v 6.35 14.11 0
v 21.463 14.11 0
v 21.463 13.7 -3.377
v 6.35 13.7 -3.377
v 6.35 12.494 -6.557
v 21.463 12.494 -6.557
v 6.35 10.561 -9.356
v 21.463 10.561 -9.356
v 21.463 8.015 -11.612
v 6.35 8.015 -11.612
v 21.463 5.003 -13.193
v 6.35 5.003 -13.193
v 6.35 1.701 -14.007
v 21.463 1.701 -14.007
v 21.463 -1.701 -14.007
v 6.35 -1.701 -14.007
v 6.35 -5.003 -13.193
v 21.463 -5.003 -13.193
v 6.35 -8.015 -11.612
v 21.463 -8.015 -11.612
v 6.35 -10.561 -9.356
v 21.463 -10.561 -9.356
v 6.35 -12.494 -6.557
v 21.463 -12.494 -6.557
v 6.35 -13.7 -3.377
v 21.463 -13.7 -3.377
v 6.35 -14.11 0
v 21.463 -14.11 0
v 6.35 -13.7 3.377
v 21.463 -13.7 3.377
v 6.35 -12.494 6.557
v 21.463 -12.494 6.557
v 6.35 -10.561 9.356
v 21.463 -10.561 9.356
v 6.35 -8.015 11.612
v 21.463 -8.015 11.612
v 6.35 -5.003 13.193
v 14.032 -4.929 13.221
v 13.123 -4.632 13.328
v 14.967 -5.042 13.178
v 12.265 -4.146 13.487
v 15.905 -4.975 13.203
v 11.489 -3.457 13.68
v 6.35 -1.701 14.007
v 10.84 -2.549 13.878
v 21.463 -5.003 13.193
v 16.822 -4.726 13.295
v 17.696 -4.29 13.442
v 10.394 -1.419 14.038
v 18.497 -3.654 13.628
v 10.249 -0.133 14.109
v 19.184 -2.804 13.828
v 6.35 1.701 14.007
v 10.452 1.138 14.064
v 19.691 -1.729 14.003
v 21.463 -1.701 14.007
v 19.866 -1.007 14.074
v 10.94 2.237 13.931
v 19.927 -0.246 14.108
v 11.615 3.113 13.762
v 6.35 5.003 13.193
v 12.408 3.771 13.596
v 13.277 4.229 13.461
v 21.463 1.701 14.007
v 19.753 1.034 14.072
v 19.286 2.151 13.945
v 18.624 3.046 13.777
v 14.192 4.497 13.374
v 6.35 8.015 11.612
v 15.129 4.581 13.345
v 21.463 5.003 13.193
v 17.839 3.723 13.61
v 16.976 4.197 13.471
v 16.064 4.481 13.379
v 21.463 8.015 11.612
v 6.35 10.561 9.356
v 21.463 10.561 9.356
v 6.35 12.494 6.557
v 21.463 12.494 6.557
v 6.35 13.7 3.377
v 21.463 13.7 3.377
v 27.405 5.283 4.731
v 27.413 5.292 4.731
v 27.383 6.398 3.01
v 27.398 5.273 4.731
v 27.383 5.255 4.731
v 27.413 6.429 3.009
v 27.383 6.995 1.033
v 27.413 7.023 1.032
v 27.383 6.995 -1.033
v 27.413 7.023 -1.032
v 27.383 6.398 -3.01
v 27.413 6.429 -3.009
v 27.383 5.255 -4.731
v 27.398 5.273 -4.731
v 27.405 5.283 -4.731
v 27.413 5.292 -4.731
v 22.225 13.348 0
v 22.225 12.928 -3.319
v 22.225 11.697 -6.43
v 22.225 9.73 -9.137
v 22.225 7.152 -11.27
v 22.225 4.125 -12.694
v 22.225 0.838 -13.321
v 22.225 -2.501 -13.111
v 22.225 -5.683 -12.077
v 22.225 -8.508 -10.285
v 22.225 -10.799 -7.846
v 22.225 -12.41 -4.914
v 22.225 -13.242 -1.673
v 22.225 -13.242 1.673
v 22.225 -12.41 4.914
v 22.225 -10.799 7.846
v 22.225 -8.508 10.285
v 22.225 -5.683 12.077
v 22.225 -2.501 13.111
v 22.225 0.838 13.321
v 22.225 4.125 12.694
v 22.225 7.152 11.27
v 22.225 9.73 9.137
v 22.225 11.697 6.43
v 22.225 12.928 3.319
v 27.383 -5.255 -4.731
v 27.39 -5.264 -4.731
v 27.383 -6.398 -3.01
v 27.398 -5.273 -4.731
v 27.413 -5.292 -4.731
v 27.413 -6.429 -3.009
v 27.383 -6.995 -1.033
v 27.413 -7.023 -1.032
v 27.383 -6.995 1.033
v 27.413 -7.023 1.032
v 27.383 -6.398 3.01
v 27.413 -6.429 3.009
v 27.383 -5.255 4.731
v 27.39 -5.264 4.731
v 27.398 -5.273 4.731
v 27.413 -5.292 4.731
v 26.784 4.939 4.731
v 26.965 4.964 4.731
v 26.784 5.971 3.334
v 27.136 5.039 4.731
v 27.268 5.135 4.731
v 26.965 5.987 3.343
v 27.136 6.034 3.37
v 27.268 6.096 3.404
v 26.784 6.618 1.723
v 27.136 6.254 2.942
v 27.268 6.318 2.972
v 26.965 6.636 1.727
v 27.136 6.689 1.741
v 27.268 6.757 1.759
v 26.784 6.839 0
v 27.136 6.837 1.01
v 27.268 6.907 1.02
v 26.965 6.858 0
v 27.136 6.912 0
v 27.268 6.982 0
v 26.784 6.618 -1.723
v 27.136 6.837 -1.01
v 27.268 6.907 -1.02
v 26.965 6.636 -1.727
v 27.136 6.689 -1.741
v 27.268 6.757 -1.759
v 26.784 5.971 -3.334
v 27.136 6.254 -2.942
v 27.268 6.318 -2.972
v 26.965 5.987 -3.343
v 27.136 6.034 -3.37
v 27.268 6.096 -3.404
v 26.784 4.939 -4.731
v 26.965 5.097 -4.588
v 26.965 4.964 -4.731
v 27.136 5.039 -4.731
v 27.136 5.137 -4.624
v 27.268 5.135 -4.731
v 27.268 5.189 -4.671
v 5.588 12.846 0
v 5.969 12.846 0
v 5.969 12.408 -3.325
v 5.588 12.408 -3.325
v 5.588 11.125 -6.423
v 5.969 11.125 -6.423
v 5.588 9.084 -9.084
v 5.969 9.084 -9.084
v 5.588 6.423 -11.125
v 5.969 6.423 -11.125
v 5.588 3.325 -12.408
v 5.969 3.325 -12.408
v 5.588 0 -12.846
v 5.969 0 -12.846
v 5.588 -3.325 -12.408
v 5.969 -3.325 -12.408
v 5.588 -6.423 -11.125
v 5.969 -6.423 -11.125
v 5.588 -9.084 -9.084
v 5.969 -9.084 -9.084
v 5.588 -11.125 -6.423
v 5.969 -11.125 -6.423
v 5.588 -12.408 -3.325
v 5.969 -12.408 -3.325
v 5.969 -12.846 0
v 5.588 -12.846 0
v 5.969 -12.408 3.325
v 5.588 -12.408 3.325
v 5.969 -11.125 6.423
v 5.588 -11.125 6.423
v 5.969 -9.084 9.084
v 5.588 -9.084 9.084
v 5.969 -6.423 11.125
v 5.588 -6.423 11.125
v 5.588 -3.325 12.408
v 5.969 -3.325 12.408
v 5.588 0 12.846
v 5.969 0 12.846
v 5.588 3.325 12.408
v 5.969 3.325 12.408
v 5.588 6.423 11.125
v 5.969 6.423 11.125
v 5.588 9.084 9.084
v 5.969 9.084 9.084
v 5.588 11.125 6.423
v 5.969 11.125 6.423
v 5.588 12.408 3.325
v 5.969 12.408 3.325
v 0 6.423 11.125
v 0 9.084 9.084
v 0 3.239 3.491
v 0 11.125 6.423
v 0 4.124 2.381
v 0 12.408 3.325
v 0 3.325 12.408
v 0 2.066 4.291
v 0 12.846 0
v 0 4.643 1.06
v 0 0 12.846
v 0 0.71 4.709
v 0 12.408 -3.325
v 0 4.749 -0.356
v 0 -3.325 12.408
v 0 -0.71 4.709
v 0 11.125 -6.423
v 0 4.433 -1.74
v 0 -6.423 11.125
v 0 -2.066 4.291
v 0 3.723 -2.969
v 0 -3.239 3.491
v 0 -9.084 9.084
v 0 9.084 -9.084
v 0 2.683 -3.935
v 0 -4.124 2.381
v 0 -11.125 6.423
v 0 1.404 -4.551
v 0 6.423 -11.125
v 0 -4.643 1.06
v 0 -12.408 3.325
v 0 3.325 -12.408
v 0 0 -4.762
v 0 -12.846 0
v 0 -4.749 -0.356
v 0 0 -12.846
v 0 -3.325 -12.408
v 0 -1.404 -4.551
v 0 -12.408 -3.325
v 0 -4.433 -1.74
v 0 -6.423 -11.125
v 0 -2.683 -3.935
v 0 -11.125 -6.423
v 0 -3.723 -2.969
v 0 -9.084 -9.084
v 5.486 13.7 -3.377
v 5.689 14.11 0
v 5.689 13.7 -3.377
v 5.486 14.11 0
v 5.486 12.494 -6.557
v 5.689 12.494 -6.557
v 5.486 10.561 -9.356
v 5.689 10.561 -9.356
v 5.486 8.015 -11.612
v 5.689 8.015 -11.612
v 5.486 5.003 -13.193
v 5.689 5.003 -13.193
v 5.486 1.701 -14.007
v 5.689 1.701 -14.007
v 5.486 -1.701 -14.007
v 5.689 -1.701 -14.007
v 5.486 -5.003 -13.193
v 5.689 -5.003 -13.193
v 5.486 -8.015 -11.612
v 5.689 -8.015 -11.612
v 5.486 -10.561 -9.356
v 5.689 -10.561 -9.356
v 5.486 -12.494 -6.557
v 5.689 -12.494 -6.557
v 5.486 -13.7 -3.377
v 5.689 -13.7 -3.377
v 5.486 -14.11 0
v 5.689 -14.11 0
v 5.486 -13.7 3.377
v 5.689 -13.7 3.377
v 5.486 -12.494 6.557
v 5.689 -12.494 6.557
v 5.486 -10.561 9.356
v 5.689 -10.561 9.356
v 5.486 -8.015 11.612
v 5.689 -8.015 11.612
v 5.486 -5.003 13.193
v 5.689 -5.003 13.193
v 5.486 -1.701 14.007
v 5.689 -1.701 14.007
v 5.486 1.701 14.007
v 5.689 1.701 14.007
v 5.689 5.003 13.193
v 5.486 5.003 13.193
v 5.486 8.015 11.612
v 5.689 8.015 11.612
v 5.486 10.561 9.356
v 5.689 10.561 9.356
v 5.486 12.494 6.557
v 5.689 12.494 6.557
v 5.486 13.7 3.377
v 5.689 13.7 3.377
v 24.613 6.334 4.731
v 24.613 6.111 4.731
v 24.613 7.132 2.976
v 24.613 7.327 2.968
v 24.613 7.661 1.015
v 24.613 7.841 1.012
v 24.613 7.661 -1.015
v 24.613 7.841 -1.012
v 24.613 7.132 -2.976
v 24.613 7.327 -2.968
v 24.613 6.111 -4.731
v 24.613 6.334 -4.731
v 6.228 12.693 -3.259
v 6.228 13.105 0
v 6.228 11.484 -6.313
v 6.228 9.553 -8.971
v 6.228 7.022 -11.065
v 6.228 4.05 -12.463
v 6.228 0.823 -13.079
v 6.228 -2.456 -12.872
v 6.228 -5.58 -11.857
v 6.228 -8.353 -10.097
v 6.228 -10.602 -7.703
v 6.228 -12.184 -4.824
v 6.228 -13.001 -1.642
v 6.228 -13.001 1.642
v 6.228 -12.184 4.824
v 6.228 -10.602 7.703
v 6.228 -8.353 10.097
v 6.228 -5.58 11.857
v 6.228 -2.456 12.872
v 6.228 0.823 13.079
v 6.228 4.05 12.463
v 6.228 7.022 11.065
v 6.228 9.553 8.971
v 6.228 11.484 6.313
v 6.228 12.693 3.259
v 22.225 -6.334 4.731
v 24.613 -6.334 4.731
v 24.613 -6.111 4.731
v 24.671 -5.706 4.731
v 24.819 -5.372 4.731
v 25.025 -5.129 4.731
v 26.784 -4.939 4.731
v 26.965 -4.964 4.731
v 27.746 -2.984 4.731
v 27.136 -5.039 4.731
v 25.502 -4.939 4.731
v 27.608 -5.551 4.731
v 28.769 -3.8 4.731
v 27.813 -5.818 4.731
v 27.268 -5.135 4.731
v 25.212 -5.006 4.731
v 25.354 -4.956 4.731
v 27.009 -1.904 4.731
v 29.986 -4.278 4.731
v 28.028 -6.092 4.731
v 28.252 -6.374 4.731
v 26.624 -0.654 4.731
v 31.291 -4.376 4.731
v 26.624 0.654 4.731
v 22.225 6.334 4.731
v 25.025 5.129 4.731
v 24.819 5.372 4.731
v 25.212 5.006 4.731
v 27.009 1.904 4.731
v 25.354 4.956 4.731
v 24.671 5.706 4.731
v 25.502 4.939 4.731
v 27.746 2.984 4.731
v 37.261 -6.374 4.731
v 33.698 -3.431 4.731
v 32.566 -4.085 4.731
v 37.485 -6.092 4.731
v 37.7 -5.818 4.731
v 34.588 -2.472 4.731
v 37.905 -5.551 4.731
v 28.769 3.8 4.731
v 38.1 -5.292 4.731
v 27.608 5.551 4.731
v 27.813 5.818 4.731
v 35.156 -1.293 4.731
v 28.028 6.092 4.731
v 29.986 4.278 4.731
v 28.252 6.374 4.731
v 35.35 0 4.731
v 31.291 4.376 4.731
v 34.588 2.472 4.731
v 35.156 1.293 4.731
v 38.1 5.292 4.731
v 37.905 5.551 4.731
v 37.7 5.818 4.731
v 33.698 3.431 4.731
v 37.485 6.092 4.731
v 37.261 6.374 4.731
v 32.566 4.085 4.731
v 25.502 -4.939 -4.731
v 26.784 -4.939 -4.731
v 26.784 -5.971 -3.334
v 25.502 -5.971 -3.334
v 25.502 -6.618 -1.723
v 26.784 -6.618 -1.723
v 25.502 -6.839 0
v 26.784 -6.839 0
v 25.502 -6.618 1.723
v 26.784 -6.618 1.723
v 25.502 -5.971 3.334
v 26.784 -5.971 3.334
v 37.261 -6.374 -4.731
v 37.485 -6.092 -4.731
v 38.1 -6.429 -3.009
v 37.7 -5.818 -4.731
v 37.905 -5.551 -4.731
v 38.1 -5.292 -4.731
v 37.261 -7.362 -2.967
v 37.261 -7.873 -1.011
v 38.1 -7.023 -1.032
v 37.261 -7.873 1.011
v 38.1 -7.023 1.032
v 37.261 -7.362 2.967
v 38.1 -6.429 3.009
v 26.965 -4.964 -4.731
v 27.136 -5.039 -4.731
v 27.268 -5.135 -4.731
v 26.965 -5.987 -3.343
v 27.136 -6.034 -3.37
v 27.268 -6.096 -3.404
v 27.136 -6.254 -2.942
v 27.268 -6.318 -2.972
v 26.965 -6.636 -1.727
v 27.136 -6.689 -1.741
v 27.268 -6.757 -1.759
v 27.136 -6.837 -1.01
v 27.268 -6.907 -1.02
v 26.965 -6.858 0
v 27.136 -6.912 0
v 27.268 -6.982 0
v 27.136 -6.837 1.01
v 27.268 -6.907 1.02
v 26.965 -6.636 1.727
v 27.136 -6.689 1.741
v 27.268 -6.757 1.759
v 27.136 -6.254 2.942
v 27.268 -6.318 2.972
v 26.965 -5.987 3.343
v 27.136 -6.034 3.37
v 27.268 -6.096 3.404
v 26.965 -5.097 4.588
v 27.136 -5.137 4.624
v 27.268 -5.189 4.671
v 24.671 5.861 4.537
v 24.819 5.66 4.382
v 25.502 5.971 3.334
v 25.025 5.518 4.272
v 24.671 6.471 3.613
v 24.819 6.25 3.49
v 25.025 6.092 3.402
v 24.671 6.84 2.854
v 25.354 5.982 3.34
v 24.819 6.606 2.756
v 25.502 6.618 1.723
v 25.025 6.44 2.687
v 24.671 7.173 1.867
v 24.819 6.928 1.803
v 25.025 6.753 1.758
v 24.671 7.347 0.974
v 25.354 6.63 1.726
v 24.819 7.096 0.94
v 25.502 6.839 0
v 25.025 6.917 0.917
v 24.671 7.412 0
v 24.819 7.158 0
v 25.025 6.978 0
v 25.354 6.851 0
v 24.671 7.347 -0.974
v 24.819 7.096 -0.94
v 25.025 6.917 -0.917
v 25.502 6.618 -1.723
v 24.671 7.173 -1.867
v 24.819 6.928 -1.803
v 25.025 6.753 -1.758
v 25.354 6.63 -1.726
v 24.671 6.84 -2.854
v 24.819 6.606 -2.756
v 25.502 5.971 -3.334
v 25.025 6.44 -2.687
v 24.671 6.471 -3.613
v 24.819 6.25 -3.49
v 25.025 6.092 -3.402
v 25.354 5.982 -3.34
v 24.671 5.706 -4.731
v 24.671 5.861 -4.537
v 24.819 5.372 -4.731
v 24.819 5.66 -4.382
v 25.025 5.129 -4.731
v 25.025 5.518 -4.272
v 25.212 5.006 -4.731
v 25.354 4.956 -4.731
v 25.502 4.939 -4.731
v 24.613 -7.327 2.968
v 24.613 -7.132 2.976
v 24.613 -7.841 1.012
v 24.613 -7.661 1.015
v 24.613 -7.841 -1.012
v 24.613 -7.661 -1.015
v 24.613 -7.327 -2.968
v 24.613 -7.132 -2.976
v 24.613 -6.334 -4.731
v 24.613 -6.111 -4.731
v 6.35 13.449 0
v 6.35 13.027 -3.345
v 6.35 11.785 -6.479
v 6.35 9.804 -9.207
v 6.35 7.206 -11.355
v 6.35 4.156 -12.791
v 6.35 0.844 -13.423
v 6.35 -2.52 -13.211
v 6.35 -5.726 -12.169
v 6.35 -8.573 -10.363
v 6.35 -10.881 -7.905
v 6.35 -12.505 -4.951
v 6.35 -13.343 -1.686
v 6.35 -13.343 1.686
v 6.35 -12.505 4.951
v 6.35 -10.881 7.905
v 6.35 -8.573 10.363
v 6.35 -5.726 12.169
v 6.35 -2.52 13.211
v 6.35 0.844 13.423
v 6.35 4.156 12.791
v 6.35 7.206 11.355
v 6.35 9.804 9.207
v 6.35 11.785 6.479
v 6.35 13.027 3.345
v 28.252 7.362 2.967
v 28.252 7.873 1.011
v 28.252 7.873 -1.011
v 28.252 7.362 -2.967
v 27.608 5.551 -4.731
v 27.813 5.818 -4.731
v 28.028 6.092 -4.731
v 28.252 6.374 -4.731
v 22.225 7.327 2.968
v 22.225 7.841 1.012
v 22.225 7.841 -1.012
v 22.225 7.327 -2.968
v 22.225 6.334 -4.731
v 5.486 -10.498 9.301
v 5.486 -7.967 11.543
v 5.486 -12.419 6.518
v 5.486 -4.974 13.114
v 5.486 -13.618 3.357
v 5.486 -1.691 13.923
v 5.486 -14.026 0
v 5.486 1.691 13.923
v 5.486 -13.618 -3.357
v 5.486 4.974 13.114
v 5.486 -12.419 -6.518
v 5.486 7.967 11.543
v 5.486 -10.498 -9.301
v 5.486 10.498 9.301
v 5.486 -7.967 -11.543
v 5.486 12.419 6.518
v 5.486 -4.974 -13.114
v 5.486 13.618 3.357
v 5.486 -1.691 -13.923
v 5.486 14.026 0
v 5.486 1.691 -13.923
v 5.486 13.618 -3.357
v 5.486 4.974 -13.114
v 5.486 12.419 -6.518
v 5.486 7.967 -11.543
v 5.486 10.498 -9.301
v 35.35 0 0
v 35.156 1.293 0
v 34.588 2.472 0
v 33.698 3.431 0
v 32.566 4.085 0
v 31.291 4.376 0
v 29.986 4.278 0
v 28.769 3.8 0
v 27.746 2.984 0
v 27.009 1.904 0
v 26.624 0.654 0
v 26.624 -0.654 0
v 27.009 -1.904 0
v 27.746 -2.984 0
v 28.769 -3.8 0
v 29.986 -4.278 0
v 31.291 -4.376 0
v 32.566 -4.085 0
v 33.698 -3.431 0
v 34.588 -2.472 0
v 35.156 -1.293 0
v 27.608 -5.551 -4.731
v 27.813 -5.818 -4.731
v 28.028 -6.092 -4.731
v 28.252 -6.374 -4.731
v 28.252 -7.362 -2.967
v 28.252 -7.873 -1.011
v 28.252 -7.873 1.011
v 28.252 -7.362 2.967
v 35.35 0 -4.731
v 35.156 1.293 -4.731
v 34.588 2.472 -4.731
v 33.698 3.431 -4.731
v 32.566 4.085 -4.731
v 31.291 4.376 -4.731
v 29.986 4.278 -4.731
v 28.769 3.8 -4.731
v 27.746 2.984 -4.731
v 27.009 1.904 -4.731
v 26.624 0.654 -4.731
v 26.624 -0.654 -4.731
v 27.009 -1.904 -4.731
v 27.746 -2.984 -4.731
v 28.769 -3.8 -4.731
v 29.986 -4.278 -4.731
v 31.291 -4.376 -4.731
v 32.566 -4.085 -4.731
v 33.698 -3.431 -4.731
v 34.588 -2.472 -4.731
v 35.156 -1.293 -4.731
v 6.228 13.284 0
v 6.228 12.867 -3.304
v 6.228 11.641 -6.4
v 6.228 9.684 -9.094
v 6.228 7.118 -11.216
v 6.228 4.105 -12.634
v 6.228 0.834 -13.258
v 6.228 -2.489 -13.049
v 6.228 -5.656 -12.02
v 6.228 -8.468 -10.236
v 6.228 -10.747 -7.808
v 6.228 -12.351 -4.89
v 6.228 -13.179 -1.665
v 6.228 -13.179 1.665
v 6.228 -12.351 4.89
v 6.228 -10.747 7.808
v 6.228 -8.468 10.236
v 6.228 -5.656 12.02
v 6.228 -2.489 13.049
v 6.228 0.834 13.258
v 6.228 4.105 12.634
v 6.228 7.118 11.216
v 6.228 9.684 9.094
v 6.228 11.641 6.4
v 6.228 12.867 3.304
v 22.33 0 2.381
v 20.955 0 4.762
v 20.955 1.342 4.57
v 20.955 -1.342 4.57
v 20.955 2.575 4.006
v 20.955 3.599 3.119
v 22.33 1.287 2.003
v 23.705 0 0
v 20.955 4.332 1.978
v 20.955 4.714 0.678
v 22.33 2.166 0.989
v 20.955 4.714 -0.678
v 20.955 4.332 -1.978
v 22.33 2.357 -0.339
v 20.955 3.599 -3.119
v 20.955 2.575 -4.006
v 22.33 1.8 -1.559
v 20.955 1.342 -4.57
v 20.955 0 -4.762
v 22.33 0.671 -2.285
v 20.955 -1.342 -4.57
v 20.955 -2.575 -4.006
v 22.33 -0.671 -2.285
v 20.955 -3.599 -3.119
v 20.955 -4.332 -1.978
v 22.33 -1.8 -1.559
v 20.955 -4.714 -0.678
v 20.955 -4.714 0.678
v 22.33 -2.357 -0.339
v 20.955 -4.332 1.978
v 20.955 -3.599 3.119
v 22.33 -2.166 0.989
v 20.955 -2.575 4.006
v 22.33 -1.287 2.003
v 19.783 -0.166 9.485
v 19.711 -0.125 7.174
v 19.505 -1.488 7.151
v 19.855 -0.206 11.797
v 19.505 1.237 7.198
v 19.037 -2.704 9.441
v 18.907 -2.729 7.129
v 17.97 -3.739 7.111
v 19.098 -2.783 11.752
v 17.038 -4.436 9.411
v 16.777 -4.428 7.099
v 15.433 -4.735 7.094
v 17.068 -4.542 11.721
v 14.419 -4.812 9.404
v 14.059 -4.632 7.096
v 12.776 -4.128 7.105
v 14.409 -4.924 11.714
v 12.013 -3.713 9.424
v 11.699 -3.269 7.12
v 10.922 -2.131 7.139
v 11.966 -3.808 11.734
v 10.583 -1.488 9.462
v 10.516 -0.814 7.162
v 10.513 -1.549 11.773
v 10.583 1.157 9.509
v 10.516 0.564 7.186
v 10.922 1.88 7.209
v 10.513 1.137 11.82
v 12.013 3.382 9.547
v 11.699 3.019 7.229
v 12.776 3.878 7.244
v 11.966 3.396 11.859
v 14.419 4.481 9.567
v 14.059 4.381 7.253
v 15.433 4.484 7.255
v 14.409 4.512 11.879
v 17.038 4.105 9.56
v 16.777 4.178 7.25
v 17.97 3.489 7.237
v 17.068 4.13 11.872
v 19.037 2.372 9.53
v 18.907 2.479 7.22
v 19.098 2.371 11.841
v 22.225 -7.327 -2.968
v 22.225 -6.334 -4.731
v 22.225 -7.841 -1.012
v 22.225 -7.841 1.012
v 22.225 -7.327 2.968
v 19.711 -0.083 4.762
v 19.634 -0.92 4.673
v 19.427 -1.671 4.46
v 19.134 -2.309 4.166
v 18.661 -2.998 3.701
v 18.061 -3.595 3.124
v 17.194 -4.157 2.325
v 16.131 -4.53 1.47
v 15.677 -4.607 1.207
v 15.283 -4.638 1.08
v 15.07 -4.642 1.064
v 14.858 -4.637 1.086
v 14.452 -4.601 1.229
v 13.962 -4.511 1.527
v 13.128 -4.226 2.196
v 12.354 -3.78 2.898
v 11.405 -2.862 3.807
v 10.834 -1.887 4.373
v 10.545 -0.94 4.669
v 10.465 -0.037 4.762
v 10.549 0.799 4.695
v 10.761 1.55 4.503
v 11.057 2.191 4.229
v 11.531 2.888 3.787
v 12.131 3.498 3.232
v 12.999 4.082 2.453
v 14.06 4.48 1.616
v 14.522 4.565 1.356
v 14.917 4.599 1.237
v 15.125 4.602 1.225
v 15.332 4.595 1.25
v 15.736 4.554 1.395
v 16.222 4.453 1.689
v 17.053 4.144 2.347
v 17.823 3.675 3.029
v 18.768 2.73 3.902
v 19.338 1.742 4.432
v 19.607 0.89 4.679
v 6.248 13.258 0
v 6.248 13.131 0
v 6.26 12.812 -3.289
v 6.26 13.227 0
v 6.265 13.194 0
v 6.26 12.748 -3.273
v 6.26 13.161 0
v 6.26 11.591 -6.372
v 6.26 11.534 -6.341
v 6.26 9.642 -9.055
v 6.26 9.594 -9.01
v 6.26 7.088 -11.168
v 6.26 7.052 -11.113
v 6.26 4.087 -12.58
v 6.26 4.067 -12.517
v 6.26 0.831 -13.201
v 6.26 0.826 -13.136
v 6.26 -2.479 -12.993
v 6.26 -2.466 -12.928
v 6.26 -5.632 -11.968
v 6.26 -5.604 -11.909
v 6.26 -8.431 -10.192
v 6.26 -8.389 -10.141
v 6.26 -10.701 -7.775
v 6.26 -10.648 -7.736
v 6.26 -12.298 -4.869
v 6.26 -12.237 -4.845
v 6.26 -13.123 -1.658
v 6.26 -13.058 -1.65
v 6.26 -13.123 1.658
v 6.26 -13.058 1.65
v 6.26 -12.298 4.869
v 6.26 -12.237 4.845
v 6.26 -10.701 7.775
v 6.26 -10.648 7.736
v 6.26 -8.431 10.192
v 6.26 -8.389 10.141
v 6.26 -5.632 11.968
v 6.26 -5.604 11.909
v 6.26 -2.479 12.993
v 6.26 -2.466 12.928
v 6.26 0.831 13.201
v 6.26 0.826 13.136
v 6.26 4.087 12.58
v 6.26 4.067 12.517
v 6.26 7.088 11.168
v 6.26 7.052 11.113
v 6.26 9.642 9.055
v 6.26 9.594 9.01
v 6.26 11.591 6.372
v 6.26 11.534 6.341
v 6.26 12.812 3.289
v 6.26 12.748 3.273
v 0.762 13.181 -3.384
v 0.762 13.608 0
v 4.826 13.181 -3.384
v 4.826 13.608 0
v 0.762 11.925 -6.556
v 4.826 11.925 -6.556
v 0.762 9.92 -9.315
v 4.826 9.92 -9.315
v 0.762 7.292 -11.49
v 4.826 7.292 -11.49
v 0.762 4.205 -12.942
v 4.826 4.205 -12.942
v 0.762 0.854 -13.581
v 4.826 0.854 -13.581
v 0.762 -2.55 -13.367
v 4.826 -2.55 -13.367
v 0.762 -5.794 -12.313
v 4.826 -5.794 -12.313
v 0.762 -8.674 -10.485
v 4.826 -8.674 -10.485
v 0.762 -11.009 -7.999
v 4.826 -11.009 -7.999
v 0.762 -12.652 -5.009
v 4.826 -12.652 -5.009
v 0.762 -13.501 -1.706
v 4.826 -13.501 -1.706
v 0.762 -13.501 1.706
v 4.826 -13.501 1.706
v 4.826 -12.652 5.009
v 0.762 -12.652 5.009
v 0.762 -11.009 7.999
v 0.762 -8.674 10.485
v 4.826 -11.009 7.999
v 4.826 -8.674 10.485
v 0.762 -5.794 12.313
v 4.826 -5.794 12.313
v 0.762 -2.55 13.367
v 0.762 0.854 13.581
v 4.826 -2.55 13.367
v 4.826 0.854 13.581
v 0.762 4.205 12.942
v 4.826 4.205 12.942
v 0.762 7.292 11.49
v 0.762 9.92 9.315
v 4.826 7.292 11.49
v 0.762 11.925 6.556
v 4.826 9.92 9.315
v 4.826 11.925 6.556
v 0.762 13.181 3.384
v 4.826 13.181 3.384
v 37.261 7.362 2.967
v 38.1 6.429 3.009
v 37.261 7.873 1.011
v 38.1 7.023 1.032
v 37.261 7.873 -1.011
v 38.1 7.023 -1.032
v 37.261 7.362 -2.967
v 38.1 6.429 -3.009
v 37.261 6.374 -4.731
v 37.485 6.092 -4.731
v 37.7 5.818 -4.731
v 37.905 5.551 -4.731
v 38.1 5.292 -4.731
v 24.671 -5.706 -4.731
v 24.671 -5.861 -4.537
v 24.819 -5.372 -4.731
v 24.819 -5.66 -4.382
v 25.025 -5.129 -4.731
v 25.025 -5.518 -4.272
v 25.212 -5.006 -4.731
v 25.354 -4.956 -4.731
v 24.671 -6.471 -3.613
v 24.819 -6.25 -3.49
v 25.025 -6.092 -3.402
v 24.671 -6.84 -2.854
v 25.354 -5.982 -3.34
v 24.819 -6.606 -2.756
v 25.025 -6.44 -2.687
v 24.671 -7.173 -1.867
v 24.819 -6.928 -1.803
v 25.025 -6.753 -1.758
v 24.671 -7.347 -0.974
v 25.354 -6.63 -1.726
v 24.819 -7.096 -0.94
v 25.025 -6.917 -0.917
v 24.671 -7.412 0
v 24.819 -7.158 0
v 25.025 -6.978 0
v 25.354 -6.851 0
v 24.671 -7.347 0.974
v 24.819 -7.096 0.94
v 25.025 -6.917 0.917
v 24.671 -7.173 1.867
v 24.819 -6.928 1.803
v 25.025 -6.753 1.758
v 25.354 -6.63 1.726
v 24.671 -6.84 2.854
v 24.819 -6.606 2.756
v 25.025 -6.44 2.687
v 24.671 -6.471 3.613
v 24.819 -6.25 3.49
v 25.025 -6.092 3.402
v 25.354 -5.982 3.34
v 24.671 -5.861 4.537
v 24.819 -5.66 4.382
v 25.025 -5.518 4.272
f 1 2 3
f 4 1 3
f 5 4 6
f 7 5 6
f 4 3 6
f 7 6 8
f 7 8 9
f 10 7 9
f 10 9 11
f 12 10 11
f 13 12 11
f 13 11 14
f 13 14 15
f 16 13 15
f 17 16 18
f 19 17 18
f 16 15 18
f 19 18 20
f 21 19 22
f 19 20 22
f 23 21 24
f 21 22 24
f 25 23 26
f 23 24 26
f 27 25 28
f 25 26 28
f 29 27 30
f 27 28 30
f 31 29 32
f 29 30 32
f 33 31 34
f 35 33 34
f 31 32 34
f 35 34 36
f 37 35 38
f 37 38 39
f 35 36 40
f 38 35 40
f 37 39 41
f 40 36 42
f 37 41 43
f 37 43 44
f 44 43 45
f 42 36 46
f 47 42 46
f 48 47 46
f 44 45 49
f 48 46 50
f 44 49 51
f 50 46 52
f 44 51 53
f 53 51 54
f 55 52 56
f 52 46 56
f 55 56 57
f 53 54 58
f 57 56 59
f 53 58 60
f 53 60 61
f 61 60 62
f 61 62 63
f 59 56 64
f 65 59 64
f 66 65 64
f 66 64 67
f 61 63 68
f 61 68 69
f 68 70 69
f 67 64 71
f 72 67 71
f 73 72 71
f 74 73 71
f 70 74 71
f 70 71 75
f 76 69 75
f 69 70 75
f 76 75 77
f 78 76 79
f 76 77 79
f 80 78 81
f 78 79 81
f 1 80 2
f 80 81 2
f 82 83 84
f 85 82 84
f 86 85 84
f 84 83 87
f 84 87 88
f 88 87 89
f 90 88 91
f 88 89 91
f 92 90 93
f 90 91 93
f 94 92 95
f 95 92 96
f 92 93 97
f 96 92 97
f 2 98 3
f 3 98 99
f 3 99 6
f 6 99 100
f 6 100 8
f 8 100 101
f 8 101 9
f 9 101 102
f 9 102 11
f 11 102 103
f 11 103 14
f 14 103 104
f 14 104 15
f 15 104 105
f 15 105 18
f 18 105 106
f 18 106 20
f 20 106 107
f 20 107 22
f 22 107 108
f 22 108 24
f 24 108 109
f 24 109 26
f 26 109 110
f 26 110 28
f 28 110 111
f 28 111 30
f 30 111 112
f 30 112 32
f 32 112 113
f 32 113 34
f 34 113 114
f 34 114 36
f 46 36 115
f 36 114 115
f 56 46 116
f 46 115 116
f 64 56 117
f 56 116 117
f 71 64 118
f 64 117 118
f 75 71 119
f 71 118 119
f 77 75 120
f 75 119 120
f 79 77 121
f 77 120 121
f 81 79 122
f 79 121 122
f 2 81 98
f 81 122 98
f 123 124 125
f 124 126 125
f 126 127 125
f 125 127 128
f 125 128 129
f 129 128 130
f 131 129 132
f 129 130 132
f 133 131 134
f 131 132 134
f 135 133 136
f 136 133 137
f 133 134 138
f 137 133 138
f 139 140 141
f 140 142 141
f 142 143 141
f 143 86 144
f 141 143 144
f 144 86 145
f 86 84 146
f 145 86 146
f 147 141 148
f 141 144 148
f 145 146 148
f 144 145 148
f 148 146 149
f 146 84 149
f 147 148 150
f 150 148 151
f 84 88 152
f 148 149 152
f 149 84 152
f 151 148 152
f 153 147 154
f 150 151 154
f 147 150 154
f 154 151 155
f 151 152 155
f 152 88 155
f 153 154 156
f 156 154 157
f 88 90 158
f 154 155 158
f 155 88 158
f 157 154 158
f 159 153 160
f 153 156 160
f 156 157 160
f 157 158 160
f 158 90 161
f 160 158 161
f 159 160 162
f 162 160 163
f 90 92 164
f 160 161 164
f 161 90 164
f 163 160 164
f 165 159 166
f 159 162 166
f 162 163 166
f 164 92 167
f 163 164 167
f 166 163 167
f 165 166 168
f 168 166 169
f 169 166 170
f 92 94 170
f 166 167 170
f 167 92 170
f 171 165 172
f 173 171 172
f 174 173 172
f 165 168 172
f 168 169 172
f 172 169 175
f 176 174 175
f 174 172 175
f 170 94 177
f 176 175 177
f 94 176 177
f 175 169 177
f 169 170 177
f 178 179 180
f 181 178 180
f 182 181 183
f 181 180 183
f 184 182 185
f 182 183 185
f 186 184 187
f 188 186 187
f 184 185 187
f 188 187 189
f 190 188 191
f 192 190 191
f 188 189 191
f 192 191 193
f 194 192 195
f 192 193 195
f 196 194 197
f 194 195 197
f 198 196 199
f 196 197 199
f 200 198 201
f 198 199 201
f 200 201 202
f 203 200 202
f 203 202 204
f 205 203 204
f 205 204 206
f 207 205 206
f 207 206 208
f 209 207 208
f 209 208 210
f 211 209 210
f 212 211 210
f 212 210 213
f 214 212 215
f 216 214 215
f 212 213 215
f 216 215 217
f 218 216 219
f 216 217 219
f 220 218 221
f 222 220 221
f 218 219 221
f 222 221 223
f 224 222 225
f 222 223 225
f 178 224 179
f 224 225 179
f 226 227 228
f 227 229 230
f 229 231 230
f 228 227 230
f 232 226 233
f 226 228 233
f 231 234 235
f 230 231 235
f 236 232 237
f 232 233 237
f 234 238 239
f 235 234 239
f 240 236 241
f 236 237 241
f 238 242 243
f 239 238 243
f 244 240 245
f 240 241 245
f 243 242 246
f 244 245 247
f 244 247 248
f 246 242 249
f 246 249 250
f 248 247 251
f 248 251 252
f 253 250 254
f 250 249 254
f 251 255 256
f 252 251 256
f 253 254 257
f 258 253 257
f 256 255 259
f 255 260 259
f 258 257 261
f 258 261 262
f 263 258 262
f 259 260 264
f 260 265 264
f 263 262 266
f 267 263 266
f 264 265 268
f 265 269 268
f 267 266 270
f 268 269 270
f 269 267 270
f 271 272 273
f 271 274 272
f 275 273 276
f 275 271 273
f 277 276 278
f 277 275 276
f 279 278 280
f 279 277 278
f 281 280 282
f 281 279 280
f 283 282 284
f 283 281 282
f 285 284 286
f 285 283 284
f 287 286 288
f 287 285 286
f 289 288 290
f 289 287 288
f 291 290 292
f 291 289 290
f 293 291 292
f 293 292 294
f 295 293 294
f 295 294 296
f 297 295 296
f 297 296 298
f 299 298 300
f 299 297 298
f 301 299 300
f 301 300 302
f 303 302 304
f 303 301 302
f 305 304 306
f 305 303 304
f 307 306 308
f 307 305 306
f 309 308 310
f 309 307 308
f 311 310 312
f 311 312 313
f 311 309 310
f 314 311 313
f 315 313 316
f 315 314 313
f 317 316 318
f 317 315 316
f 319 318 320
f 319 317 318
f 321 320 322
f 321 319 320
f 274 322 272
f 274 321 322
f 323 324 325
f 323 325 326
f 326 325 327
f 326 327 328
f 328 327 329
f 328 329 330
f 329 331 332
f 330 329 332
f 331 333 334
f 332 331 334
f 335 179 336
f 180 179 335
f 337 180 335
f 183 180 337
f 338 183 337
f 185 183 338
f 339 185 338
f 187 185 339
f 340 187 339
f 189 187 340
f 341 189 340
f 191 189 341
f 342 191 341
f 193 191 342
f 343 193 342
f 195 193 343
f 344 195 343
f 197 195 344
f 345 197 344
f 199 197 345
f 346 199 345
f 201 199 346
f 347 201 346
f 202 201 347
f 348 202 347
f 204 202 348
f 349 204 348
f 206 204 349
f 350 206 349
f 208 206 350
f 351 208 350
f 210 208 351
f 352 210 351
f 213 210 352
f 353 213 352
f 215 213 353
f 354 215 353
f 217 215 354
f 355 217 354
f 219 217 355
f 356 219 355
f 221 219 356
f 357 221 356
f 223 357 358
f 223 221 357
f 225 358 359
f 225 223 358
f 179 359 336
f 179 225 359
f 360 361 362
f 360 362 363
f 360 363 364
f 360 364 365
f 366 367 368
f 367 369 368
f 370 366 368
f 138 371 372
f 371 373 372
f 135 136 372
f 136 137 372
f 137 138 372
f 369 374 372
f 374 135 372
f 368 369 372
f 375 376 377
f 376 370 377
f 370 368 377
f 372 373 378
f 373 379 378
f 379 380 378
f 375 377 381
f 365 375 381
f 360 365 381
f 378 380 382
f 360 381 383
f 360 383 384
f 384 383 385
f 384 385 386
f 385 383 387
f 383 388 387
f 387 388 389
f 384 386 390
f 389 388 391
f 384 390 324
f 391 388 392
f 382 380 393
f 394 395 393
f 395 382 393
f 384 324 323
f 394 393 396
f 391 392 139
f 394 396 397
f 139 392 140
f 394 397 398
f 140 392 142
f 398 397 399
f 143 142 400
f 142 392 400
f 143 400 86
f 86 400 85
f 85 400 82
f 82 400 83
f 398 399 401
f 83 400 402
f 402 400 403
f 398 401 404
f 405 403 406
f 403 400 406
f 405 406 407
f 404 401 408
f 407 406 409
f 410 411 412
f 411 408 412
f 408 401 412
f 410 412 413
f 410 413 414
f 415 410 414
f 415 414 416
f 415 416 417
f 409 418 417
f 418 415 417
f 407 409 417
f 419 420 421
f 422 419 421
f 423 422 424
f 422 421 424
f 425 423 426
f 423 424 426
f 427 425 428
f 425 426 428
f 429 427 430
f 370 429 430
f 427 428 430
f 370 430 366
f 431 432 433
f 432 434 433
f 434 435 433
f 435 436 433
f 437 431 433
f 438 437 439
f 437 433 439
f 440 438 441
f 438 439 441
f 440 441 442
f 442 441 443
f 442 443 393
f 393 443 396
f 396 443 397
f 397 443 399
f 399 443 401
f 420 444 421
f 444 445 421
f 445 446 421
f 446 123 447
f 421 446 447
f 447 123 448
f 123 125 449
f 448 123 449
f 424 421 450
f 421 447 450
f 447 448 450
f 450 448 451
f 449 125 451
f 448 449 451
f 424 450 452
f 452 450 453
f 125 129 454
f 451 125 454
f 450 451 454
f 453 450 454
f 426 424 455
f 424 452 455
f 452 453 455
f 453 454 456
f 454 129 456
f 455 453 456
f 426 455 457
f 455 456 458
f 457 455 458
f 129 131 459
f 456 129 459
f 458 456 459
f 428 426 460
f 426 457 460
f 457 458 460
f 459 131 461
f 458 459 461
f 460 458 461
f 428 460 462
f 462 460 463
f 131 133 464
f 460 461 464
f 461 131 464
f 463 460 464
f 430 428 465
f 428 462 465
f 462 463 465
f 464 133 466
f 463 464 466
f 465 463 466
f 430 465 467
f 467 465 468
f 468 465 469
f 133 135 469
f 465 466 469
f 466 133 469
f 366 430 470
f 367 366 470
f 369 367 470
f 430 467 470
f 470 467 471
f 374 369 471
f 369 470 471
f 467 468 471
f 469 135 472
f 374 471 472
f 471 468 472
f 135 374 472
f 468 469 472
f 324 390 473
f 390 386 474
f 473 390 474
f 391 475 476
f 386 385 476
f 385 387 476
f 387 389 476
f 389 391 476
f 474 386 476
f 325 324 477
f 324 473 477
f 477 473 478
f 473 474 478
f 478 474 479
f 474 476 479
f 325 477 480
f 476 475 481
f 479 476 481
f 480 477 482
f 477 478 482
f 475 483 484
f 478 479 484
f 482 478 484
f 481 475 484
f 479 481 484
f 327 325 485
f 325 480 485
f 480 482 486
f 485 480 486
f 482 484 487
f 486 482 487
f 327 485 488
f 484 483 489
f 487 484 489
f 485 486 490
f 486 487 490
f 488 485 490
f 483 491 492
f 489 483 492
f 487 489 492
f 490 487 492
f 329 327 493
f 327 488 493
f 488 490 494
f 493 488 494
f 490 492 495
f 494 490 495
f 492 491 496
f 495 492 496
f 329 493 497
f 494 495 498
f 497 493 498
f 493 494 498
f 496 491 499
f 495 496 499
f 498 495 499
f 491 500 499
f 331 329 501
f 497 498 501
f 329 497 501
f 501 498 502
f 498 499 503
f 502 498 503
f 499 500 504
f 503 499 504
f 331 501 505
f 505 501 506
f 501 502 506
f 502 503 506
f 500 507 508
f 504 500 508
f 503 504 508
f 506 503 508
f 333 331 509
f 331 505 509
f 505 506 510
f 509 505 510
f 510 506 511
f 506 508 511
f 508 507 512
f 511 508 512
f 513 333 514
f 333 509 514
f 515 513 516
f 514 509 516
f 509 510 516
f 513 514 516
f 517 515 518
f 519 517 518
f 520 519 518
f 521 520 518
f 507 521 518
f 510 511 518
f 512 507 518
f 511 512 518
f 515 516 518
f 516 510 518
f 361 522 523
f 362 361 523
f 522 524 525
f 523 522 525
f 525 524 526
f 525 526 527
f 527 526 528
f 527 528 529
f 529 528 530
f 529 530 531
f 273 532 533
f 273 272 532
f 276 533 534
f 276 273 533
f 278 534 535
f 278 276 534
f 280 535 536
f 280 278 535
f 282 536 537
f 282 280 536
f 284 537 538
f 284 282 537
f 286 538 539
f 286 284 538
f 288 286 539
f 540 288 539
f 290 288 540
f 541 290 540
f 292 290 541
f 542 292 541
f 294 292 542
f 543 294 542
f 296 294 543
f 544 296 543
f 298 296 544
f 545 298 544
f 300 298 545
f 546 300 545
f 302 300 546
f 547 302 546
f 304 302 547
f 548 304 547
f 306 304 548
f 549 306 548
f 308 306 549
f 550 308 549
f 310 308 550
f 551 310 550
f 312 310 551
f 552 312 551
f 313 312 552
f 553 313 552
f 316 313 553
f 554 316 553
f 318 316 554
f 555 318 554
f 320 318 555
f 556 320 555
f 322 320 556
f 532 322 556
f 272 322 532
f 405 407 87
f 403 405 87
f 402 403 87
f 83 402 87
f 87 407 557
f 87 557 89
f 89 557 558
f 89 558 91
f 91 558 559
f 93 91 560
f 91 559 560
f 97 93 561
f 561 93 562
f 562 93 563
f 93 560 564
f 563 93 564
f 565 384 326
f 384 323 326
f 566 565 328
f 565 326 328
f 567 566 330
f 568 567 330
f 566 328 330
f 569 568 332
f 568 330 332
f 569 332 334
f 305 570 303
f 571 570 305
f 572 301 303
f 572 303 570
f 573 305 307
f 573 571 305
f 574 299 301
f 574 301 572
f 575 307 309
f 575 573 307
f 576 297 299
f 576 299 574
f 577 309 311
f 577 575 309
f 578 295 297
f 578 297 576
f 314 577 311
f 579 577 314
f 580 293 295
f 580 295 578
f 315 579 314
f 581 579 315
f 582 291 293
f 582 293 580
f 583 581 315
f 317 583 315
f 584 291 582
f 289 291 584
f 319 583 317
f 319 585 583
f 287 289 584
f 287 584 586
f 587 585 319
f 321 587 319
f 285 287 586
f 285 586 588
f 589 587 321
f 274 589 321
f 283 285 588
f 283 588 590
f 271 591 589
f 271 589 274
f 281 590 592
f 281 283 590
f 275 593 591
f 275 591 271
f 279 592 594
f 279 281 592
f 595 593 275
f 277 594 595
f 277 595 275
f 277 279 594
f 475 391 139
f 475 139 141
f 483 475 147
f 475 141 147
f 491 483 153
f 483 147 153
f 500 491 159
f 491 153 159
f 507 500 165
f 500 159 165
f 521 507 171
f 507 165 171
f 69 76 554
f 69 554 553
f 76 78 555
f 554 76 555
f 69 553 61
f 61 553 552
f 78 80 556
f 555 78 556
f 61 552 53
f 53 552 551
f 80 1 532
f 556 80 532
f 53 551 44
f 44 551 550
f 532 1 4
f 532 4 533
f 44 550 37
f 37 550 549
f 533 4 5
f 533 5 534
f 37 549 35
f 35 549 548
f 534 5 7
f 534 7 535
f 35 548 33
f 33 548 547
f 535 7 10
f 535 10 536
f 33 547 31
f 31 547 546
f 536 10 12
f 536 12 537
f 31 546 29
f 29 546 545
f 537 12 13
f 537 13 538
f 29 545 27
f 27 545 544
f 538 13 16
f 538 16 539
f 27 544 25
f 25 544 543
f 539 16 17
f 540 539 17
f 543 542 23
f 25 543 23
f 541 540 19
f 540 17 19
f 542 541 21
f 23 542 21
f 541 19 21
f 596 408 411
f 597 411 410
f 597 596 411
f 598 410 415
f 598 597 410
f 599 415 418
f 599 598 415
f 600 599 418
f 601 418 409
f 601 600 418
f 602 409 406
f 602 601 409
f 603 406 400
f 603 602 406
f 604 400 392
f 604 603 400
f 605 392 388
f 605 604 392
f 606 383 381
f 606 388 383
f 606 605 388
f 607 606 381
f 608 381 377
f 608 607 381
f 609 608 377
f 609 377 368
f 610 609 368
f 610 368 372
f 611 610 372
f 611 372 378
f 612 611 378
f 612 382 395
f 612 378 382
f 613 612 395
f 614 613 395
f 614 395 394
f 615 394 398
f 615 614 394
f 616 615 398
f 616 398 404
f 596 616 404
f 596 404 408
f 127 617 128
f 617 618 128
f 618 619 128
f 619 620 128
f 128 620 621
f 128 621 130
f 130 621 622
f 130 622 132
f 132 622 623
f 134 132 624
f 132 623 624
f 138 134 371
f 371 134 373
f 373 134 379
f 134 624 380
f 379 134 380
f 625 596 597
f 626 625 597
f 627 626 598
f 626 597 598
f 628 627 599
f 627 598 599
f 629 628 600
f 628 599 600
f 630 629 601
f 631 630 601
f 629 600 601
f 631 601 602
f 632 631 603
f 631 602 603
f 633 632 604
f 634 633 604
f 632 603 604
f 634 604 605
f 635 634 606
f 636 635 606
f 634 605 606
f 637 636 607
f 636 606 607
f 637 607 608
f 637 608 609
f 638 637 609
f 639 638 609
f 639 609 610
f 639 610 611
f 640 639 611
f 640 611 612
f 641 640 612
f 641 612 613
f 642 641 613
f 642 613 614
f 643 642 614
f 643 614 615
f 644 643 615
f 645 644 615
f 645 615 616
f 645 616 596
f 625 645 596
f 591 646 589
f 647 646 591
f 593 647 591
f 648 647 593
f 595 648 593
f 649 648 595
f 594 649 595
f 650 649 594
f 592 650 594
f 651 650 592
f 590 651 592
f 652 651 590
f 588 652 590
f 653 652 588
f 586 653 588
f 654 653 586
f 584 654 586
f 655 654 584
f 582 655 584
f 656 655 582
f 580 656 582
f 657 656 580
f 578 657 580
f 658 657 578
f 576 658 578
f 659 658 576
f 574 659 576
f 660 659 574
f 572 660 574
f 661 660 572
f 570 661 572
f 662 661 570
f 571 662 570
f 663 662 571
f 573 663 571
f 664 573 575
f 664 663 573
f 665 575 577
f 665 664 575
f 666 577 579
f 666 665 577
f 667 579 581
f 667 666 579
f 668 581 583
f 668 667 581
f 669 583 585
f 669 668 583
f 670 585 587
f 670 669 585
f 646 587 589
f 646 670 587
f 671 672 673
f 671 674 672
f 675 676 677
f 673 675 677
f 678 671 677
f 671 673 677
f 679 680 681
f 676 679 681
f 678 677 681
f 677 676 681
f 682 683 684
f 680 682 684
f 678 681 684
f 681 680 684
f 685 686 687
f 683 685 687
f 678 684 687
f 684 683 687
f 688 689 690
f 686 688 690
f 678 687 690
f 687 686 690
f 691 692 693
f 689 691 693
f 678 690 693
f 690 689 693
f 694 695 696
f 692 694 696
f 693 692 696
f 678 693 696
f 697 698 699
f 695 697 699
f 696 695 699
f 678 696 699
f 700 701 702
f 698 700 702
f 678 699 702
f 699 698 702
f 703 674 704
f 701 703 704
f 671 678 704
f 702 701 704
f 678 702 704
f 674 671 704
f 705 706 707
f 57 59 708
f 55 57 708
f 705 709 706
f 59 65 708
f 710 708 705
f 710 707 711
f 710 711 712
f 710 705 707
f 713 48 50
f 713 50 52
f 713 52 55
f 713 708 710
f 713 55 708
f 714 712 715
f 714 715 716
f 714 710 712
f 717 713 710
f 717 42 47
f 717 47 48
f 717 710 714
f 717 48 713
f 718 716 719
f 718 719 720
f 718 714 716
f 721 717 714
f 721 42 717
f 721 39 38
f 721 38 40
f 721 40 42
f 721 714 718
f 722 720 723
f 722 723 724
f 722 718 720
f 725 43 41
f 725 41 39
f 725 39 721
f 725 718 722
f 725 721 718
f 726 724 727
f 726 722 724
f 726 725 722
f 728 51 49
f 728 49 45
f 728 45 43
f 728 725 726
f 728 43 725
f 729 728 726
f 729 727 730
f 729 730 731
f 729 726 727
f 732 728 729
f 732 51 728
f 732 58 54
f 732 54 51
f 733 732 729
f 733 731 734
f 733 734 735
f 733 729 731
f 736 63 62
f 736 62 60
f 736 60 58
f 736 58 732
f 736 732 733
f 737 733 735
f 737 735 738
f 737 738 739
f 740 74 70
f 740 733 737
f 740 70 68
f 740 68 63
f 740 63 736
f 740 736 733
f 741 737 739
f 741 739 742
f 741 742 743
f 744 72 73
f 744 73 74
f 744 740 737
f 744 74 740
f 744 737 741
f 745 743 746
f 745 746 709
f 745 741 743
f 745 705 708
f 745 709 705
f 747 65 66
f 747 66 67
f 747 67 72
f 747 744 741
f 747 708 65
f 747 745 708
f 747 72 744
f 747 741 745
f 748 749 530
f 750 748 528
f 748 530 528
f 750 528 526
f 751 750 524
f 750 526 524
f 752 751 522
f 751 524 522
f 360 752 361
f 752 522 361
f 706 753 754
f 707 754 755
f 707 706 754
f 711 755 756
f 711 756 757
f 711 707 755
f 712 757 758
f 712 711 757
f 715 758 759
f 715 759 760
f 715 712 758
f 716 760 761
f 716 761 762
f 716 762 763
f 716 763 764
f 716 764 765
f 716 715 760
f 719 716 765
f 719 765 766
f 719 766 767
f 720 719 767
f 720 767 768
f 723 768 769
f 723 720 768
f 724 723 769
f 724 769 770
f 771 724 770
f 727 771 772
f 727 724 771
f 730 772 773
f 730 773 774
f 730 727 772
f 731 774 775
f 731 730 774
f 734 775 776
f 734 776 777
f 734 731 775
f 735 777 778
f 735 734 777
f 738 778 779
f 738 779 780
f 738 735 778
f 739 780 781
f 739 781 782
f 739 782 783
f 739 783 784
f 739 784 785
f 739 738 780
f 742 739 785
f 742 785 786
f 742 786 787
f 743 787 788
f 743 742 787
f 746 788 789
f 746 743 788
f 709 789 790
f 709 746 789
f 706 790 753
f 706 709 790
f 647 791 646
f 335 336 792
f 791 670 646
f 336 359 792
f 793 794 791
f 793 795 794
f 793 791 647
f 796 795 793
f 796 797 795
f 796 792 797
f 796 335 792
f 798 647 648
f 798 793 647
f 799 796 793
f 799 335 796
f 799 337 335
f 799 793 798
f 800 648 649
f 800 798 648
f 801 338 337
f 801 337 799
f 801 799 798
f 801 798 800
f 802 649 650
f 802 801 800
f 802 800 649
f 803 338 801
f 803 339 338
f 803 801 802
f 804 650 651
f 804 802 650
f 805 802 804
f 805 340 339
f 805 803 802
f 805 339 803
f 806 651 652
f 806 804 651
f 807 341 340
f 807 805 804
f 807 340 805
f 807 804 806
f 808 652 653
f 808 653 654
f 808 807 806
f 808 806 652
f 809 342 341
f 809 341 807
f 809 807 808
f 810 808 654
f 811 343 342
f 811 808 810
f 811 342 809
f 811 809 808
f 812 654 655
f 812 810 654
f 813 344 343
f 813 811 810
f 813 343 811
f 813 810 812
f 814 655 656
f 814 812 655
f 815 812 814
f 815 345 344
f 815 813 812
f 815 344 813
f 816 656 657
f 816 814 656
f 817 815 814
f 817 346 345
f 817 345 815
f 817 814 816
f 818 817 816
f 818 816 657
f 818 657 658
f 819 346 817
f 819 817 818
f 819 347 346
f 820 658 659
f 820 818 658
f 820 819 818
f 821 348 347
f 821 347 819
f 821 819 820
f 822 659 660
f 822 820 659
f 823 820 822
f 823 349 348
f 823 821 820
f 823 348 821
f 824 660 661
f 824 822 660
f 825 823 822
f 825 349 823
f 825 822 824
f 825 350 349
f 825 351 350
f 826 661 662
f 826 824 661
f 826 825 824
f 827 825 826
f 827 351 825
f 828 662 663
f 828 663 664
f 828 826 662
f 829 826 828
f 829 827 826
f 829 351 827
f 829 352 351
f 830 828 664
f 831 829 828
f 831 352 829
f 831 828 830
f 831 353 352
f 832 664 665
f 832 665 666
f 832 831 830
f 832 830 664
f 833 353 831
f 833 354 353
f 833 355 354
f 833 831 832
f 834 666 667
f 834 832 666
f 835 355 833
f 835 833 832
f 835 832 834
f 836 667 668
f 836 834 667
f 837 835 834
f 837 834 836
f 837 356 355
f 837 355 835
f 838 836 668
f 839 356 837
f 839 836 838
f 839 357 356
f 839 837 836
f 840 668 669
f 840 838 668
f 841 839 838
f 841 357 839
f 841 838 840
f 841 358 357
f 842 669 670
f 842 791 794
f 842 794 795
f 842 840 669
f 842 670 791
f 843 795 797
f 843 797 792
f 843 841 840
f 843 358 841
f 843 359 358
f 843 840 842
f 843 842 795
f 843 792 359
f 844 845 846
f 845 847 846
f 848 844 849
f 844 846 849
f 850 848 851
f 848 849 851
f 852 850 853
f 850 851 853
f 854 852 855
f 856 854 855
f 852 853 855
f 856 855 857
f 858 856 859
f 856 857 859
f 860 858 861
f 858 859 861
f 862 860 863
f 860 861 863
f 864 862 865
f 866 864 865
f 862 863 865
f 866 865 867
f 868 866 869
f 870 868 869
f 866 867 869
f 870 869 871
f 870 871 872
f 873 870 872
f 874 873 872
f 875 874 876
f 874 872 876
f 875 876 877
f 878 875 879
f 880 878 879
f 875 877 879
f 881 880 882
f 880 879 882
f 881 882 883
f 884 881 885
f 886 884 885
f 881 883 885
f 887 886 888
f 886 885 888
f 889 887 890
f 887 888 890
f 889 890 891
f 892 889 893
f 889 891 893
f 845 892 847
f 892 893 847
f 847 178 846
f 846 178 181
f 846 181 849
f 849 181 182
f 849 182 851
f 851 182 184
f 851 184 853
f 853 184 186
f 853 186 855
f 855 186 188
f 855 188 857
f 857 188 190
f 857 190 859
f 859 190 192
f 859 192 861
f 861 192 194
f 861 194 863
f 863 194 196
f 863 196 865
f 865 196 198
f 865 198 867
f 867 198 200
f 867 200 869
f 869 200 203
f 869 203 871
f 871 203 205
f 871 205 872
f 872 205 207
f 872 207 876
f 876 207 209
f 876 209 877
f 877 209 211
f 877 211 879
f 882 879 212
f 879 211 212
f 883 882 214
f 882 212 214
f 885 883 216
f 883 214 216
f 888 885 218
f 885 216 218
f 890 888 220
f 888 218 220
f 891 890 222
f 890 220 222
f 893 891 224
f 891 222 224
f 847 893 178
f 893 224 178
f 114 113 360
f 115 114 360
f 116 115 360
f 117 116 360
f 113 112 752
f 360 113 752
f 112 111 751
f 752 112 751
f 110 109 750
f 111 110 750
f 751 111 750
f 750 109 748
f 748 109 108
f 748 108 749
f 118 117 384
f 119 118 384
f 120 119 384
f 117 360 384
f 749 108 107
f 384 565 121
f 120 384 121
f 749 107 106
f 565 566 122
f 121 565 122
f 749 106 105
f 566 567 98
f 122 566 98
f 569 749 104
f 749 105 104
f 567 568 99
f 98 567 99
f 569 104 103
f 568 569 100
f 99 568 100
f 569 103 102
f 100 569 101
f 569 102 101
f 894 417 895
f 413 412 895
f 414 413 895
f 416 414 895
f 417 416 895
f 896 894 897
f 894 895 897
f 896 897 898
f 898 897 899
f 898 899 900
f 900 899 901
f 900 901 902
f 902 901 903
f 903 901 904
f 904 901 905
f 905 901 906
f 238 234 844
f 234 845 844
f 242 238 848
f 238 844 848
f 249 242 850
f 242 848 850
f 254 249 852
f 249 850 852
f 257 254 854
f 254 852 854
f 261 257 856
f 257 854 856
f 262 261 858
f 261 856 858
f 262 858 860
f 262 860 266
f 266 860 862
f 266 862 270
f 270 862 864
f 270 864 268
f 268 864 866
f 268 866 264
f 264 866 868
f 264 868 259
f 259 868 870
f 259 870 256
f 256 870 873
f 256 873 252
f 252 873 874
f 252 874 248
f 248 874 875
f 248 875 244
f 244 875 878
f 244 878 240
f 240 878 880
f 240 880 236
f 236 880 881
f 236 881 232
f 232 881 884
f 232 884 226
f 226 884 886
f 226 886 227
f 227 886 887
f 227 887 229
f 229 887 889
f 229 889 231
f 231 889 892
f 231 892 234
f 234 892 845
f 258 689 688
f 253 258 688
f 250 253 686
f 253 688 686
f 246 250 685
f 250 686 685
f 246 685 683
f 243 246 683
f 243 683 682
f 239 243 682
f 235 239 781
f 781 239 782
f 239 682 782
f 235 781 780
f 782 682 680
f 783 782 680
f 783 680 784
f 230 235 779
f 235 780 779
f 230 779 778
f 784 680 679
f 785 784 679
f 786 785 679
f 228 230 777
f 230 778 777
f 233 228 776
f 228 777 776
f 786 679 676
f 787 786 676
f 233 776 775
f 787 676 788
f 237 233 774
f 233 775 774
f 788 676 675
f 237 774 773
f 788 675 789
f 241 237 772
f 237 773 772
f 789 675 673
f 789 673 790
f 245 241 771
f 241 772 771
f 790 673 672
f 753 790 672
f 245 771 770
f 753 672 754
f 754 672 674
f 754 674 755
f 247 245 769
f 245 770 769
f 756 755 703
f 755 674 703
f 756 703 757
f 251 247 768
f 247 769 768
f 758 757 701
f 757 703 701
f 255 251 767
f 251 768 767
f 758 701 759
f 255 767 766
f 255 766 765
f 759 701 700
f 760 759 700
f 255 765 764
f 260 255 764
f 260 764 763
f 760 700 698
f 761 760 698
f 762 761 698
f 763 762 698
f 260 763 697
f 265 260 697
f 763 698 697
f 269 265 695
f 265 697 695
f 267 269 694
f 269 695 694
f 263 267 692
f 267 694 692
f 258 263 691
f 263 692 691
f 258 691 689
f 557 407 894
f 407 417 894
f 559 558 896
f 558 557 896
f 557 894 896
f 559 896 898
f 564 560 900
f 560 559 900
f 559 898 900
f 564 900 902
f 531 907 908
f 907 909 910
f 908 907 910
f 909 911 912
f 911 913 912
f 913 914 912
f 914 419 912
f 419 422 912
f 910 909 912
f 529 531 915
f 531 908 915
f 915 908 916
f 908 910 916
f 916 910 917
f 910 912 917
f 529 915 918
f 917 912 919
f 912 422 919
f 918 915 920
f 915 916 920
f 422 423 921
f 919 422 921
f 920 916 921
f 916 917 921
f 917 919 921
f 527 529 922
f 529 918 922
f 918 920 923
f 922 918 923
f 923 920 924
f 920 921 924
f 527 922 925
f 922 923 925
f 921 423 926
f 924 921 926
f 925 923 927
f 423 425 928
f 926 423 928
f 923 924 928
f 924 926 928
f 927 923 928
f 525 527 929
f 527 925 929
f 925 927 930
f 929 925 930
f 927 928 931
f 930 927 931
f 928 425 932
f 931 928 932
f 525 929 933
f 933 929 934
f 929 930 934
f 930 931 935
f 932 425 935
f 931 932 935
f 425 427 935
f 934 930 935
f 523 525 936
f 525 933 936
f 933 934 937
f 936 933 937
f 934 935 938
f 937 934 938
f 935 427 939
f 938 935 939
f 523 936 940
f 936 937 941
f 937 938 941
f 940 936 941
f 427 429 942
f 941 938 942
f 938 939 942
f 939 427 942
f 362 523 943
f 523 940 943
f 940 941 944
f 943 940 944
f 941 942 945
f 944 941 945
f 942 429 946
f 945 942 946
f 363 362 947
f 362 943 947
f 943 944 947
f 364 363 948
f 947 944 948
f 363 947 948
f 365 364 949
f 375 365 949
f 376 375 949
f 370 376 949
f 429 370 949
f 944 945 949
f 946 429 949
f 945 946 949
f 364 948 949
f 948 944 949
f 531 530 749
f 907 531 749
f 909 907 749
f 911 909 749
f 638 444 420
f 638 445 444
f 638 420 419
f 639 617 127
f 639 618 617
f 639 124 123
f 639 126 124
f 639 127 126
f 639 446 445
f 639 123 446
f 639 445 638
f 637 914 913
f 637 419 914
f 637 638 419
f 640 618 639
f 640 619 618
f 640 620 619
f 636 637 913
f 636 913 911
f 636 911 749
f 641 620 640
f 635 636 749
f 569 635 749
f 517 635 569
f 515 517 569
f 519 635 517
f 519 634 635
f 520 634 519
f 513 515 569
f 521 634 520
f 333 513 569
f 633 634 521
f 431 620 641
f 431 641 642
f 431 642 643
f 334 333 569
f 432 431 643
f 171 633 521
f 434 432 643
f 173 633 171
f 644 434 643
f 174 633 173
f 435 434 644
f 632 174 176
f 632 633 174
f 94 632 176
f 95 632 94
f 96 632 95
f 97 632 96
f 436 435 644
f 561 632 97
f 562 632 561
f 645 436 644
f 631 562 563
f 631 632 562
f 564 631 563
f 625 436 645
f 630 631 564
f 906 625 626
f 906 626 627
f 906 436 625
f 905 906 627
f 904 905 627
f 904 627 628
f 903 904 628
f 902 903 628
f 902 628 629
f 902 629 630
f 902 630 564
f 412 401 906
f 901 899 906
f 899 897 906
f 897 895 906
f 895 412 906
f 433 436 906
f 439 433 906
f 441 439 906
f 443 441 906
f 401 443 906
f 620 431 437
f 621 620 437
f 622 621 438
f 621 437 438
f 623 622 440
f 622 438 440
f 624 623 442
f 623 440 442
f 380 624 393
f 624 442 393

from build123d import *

# Parameters (mm, degrees)
SKETCH3_W               = 56.4388
SKETCH3_H               = 112.8776
SKETCH3_W_2             = 9.4615
SKETCH3_H_2             = 56.4388
CUT_EXTRUDE1_DEPTH      = 15.875
HOLE1_D                 = 9.525
HOLE1_DEPTH             = 20.955
HOLE1_TIP               = 2.749630657
CUT_EXTRUDE2_DEPTH      = 7.096125
CUT_EXTRUDE2_DEPTH_BACK = 7.096125
SKETCH8_R               = 4.38785


with BuildPart() as part:
    # Sketch1 → Revolve1 (revolve)
    with BuildSketch(Plane.XY):
        Polygon((0, 0), (0, 12.84605), (0.762, 13.60805), (4.826, 13.60805), (5.588, 12.84605), (6.35, 12.84605), (6.35, 14.1097), (21.463, 14.1097), (22.225, 13.3477), (22.225, 0), align=None)
    revolve(axis=Axis((22.225, 0, 0), (-1, 0, 0)))

    # Sketch2 → Revolve2 (revolve)
    with BuildSketch(Plane.XY):
        with BuildLine():
            Line((22.225, 0), (22.225, 7.90575))
            Line((22.225, 7.90575), (24.6126, 7.90575))
            Line((24.6126, 7.90575), (24.6126, 7.72795))
            ThreePointArc((24.6126, 7.72795), (24.872982072, 7.099332072), (25.5016, 6.83895))
            Line((25.5016, 6.83895), (26.7843, 6.83895))
            ThreePointArc((26.7843, 6.83895), (27.10530348, 6.898927826), (27.38299292, 7.0707683))
            Line((27.38299292, 7.0707683), (27.412917928, 7.09803))
            Line((27.412917928, 7.09803), (28.252387928, 7.9375))
            Line((28.252387928, 7.9375), (37.26053, 7.9375))
            Line((37.26053, 7.9375), (38.1, 7.09803))
            Line((38.1, 7.09803), (38.1, 0))
            Line((38.1, 0), (22.225, 0))
        make_face()
    revolve(axis=Axis((38.1, 0, 0), (-1, 0, 0)))

    # Sketch3 → Cut-Extrude1 (cut)
    with BuildSketch(Plane(origin=(38.1, 0, 0), x_dir=(0, 0, -1), z_dir=(1, 0, 0))):
        Rectangle(SKETCH3_W, SKETCH3_H)
        Rectangle(SKETCH3_W_2, SKETCH3_H_2, mode=Mode.SUBTRACT)
    extrude(amount=-CUT_EXTRUDE1_DEPTH, mode=Mode.SUBTRACT)

    # Hole1
    with Locations(Plane.ZY):
        with Locations((0, 0)):
            Hole(HOLE1_D / 2, depth=HOLE1_DEPTH)
            with Locations((0, 0, -(HOLE1_DEPTH + HOLE1_TIP / 2))):  # 120° drill point
                Cone(0, HOLE1_D / 2, HOLE1_TIP, mode=Mode.SUBTRACT)

    # Sketch6 → Cut-Revolve1 (revolve, cut)
    with BuildSketch(Plane(origin=(0, 0, 0), x_dir=(1, 0, 0), z_dir=(0, 0.9998476951563913, 0.01745240643728403))):
        Polygon((15.0876, 0), (19.710593378, 0), (19.710593378, -7.1755), (19.927075925, -14.1097), (15.0876, -14.1097), align=None)
    revolve(axis=Axis((15.0876, -0.246248219, 14.107551024), (0, 0.01745240643728403, -0.9998476951563913)), mode=Mode.SUBTRACT)

    # Sketch7 → Revolve3 (revolve)
    with BuildSketch(Plane.XY):
        with BuildLine():
            Line((5.48614893, 14.025531804), (6.227512806, 13.284167928))
            ThreePointArc((6.227512806, 13.284167928), (6.264710245, 13.194365367), (6.227512806, 13.104562806))
            Line((6.227512806, 13.104562806), (5.969, 12.84605))
            Line((5.969, 12.84605), (5.588, 12.84605))
            Line((5.588, 12.84605), (5.588, 12.59205))
            Line((5.588, 12.59205), (6.35, 12.59205))
            Line((6.35, 12.59205), (6.35, 13.44904893))
            Line((6.35, 13.44904893), (5.68934893, 14.1097))
            Line((5.68934893, 14.1097), (5.48614893, 14.1097))
            Line((5.48614893, 14.1097), (5.48614893, 14.025531804))
        make_face()
    revolve(axis=Axis((6.35, 0, 0), (-1, 0, 0)))

    # Sketch8 → Cut-Extrude2 (cut, two sides: drawn at the far end of the back side and taken through both)
    with BuildSketch(Plane.XY.offset(-CUT_EXTRUDE2_DEPTH_BACK)):
        with Locations((30.9626, 0)):
            Circle(SKETCH8_R)
    extrude(amount=CUT_EXTRUDE2_DEPTH + CUT_EXTRUDE2_DEPTH_BACK, mode=Mode.SUBTRACT)


solid = part.part
